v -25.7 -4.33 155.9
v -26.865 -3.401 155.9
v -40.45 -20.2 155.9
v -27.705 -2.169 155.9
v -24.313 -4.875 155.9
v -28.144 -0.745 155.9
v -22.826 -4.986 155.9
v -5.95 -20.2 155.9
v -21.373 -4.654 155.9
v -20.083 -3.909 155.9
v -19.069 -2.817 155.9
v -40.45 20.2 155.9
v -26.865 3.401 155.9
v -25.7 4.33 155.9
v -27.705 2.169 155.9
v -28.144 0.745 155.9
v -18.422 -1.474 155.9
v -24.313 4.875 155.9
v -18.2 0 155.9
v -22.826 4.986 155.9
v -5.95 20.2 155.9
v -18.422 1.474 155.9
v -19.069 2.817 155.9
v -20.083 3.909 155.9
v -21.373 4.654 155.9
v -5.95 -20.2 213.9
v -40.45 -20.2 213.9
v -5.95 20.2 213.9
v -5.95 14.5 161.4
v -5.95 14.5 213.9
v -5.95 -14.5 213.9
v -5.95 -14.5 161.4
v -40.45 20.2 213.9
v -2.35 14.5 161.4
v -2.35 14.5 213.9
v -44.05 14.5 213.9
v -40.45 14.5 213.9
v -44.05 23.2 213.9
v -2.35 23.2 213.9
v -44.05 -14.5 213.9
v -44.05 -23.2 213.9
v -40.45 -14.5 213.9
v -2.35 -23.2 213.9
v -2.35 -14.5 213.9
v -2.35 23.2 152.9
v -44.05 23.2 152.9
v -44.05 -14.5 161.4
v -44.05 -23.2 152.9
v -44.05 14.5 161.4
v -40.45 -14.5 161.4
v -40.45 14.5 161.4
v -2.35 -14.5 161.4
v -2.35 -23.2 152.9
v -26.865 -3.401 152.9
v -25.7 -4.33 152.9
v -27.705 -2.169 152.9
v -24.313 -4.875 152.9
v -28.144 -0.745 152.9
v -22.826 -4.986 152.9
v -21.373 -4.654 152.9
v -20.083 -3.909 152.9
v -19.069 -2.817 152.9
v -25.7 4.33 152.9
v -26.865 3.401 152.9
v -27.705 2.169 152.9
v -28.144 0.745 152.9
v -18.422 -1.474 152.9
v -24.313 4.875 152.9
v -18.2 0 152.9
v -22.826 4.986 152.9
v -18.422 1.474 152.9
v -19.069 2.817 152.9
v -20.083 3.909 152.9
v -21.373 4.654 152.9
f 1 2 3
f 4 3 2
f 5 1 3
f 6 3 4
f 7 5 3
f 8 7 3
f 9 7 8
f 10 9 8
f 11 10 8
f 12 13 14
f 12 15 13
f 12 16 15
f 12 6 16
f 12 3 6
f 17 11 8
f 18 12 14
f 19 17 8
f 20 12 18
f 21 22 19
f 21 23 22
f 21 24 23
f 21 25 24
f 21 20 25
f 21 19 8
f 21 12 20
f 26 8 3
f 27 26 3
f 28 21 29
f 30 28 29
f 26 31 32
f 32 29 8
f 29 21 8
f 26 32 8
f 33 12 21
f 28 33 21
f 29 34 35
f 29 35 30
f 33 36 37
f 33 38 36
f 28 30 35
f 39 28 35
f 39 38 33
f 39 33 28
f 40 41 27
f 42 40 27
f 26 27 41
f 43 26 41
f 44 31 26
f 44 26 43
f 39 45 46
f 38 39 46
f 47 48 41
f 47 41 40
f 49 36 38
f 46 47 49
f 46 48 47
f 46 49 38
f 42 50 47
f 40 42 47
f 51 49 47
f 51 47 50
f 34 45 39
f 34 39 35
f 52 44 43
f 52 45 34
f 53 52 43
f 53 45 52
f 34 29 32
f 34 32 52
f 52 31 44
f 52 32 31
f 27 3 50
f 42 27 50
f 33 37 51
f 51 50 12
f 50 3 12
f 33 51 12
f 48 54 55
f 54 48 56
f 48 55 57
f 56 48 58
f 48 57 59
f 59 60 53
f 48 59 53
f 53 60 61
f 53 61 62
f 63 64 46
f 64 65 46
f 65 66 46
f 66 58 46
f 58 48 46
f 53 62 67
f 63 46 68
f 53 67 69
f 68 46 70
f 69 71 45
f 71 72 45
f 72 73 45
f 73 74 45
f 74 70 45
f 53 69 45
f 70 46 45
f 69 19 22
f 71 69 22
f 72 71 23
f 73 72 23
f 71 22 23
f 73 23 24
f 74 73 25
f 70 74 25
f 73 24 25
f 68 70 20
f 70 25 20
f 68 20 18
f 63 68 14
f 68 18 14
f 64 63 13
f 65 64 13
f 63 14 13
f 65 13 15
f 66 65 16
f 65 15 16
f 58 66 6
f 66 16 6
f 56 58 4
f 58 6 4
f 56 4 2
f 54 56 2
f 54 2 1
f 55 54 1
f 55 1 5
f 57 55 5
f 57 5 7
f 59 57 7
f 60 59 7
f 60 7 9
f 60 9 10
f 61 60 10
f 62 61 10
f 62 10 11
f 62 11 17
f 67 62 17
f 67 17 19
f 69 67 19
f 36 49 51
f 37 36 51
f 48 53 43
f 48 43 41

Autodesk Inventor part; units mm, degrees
ref_plane "XZ Plane" through (0, 0, 0) normal (0, 1, 0) x (-1, 0, 0)
ref_plane "XY Plane" through (0, 0, 0) normal (0, 0, 1) x (1, 0, 0)
ref_plane "작업 평면10" through (-23.2, 0, 152.9) normal (0, 0, 1) x (1, 0, 0)
sketch "스케치8" plane through (-23.2, 0, 152.9) normal (0, 0, 1) x (1, 0, 0)
  line L0 (17.25, -20.2) -> (-17.25, -20.2)
  line L1 (-17.25, -20.2) -> (-17.25, 20.2)
  line L2 (-17.25, 20.2) -> (17.25, 20.2)
  line L3 (17.25, 20.2) -> (17.25, -20.2)
  circle A0 centre (0, 0) radius 2 projected
  line L4 (-17.25, -20.2) -> (-12.65, -20.2)
  line L5 (-12.65, 20.2) -> (-17.25, 20.2)
  line L6 (-17.25, 20.2) -> (-17.25, -20.2)
  line L7 (17.25, -20.2) -> (12.65, -20.2)
  line L8 (12.65, -20.2) -> (12.65, 20.2)
  line L9 (12.65, 20.2) -> (17.25, 20.2)
  line L10 (17.25, 20.2) -> (17.25, -20.2)
  line L11 (17.25, 20.2) -> (20.85, 20.2)
  line L12 (20.85, 20.2) -> (20.85, -20.2)
  line L13 (20.85, -20.2) -> (17.25, -20.2)
  line L14 (17.25, -20.2) -> (17.25, 20.2)
  line L15 (-17.25, 20.2) -> (-12.65, 20.2)
  line L16 (-12.65, 20.2) -> (-12.65, -20.2)
  line L17 (-12.65, -20.2) -> (-17.25, -20.2)
  line L18 (-17.25, -20.2) -> (-17.25, 20.2)
  line L19 (-17.25, 20.2) -> (-20.85, 20.2)
  line L20 (-20.85, 20.2) -> (-20.85, -20.2)
  line L21 (-17.25, -20.2) -> (-17.25, 20.2)
  line L22 (20.85, 14.5) -> (17.25, 14.5)
  line L23 (17.25, 14.5) -> (17.25, -14.5)
  line L24 (17.25, -14.5) -> (20.85, -14.5)
  line L25 (20.85, -14.5) -> (20.85, 14.5)
  line L26 (0, -20.2) -> (0, 20.2) construction
  line L27 (-17.25, 20.2) -> (-17.25, -20.2)
  circle A1 centre (0, 0) radius 2
  line L28 (-17.25, -20.2) -> (-12.65, -20.2)
  line L29 (-12.65, -20.2) -> (-12.65, 20.2)
  line L30 (-12.65, 20.2) -> (-17.25, 20.2)
  line L31 (-17.25, 20.2) -> (-17.25, -20.2)
  line L32 (-17.25, 20.2) -> (-20.85, 20.2)
  line L33 (-20.85, 20.2) -> (-20.85, -20.2)
  line L34 (-17.25, -20.2) -> (-17.25, 20.2)
  line L35 (-20.85, 14.5) -> (-17.25, 14.5)
  line L36 (-17.25, 14.5) -> (-17.25, -14.5)
  line L37 (-17.25, -14.5) -> (-20.85, -14.5)
  line L38 (-20.85, -14.5) -> (-20.85, 14.5)
  line L39 (-20.85, 20.2) -> (20.85, 20.2)
  line L40 (20.85, 20.2) -> (20.85, 23.2)
  line L41 (20.85, 23.2) -> (-20.85, 23.2)
  line L42 (-20.85, 23.2) -> (-20.85, 20.2)
  line L43 (-17.25, -20.2) -> (-20.85, -20.2)
  line L44 (-20.85, -20.2) -> (20.85, -20.2)
  line L45 (20.85, -20.2) -> (20.85, -23.2)
  line L46 (20.85, -23.2) -> (-20.85, -23.2)
  line L47 (-20.85, -23.2) -> (-20.85, -20.2)
  point P0 (23.2, 0)
  point P1 (-17.25, 0)
  point P2 (20.85, 0)
  point P3 (-23.2, 0)
  point P4 (-20.85, 0)
  point P5 (17.25, 14.5)
  point P6 (20.85, -14.5)
  point P7 (17.25, -14.5)
  point P8 (-17.25, -14.5)
  point P9 (-20.85, -14.5)
  point P10 (-20.85, 14.5)
  point P11 (-17.25, 14.5)
  point P12 (-17.25, 20.2)
  point P13 (20.85, 20.2)
  point P14 (-17.25, 14.5)
  point P15 (-17.25, -14.5)
  point P16 (-20.85, -14.5)
  dimension "d27" = 34.5
  dimension "d30" = 4.6
  dimension "d33" = 29
  dimension "d34" = 40.4
  dimension "d48" = 3
  dimension "d53" = 3
extrude "돌출7" add sketch "스케치8" along normal blind 3 contours L0 L8 L2 L3 | L3 L24 L12 L13 | L0 L16 L2 L8 | L3 L22 L12 L24 | L0 L1 L2 L16 | L3 L11 L12 L22 | L43 L20 L37 L1 | L37 L20 L35 L1 | L1 L35 L20 L19
extrude "돌출8" add sketch "스케치8" along normal blind 61 contours L13 L45 L46 L47 L43 L0 | L3 L24 L12 L13 | L2 L19 L42 L41 L40 L11 | L3 L11 L12 L22 | L43 L20 L37 L1 | L1 L35 L20 L19
ref_plane "작업 평면3" through (-23.2, 0, 0) normal (1, 0, 0) x (0, 1, 0)
sketch "스케치10" plane through (-23.2, 0, 155.9) normal (0, 0, 1) x (1, 0, 0)
  line L0 (-17.25, -14.5) -> (-17.25, -20.2) projected
  line L1 (-17.25, -20.2) -> (17.25, -20.2) projected
  line L2 (17.25, -20.2) -> (17.25, -14.5) projected
  line L3 (17.25, -14.5) -> (20.85, -14.5) projected
  line L4 (20.85, -14.5) -> (20.85, 14.5) projected
  line L5 (20.85, 14.5) -> (17.25, 14.5) projected
  line L6 (17.25, 14.5) -> (17.25, 20.2) projected
  line L7 (17.25, 20.2) -> (-17.25, 20.2) projected
  circle A0 centre (0, 0) radius 2 projected
  line L8 (-20.85, -14.75) -> (-17.25, -14.75)
  line L9 (-17.25, -14.75) -> (-17.25, 14.75)
  line L10 (-17.25, 14.75) -> (-20.85, 14.75)
  line L11 (-20.85, 14.75) -> (-20.85, -14.75)
  line L12 (20.85, -14.5) -> (17.25, -14.5)
  line L13 (17.25, -14.5) -> (17.25, 14.5)
  line L14 (17.25, 14.5) -> (20.85, 14.5)
  line L15 (20.85, 14.5) -> (20.85, -14.5)
  line L16 (-17.25, 20.2) -> (-17.25, 14.5) projected
  line L17 (-17.25, 14.5) -> (-20.85, 14.5) projected
  line L18 (-20.85, 14.5) -> (-20.85, -14.5) projected
  line L19 (-20.85, -14.5) -> (-17.25, -14.5) projected
  point P0 (23.2, 0)
extrude "돌출10" add sketch "스케치10" along normal blind 5.5 contours L19 L11 L17 L9 | L0 L8 L11 L19 | L17 L11 L10 L9 | L13 L5 L4 L3
sketch "스케치11" plane through (-23.2, 0, 155.9) normal (0, 0, 1) x (1, 0, 0)
  circle A0 centre (0, 0) radius 5
  point P0 (23.2, 0)
  dimension "d54" = 10
extrude "돌출11" cut sketch "스케치11" against normal blind 5.5
properties part number "ARM_1 SKETCH"
